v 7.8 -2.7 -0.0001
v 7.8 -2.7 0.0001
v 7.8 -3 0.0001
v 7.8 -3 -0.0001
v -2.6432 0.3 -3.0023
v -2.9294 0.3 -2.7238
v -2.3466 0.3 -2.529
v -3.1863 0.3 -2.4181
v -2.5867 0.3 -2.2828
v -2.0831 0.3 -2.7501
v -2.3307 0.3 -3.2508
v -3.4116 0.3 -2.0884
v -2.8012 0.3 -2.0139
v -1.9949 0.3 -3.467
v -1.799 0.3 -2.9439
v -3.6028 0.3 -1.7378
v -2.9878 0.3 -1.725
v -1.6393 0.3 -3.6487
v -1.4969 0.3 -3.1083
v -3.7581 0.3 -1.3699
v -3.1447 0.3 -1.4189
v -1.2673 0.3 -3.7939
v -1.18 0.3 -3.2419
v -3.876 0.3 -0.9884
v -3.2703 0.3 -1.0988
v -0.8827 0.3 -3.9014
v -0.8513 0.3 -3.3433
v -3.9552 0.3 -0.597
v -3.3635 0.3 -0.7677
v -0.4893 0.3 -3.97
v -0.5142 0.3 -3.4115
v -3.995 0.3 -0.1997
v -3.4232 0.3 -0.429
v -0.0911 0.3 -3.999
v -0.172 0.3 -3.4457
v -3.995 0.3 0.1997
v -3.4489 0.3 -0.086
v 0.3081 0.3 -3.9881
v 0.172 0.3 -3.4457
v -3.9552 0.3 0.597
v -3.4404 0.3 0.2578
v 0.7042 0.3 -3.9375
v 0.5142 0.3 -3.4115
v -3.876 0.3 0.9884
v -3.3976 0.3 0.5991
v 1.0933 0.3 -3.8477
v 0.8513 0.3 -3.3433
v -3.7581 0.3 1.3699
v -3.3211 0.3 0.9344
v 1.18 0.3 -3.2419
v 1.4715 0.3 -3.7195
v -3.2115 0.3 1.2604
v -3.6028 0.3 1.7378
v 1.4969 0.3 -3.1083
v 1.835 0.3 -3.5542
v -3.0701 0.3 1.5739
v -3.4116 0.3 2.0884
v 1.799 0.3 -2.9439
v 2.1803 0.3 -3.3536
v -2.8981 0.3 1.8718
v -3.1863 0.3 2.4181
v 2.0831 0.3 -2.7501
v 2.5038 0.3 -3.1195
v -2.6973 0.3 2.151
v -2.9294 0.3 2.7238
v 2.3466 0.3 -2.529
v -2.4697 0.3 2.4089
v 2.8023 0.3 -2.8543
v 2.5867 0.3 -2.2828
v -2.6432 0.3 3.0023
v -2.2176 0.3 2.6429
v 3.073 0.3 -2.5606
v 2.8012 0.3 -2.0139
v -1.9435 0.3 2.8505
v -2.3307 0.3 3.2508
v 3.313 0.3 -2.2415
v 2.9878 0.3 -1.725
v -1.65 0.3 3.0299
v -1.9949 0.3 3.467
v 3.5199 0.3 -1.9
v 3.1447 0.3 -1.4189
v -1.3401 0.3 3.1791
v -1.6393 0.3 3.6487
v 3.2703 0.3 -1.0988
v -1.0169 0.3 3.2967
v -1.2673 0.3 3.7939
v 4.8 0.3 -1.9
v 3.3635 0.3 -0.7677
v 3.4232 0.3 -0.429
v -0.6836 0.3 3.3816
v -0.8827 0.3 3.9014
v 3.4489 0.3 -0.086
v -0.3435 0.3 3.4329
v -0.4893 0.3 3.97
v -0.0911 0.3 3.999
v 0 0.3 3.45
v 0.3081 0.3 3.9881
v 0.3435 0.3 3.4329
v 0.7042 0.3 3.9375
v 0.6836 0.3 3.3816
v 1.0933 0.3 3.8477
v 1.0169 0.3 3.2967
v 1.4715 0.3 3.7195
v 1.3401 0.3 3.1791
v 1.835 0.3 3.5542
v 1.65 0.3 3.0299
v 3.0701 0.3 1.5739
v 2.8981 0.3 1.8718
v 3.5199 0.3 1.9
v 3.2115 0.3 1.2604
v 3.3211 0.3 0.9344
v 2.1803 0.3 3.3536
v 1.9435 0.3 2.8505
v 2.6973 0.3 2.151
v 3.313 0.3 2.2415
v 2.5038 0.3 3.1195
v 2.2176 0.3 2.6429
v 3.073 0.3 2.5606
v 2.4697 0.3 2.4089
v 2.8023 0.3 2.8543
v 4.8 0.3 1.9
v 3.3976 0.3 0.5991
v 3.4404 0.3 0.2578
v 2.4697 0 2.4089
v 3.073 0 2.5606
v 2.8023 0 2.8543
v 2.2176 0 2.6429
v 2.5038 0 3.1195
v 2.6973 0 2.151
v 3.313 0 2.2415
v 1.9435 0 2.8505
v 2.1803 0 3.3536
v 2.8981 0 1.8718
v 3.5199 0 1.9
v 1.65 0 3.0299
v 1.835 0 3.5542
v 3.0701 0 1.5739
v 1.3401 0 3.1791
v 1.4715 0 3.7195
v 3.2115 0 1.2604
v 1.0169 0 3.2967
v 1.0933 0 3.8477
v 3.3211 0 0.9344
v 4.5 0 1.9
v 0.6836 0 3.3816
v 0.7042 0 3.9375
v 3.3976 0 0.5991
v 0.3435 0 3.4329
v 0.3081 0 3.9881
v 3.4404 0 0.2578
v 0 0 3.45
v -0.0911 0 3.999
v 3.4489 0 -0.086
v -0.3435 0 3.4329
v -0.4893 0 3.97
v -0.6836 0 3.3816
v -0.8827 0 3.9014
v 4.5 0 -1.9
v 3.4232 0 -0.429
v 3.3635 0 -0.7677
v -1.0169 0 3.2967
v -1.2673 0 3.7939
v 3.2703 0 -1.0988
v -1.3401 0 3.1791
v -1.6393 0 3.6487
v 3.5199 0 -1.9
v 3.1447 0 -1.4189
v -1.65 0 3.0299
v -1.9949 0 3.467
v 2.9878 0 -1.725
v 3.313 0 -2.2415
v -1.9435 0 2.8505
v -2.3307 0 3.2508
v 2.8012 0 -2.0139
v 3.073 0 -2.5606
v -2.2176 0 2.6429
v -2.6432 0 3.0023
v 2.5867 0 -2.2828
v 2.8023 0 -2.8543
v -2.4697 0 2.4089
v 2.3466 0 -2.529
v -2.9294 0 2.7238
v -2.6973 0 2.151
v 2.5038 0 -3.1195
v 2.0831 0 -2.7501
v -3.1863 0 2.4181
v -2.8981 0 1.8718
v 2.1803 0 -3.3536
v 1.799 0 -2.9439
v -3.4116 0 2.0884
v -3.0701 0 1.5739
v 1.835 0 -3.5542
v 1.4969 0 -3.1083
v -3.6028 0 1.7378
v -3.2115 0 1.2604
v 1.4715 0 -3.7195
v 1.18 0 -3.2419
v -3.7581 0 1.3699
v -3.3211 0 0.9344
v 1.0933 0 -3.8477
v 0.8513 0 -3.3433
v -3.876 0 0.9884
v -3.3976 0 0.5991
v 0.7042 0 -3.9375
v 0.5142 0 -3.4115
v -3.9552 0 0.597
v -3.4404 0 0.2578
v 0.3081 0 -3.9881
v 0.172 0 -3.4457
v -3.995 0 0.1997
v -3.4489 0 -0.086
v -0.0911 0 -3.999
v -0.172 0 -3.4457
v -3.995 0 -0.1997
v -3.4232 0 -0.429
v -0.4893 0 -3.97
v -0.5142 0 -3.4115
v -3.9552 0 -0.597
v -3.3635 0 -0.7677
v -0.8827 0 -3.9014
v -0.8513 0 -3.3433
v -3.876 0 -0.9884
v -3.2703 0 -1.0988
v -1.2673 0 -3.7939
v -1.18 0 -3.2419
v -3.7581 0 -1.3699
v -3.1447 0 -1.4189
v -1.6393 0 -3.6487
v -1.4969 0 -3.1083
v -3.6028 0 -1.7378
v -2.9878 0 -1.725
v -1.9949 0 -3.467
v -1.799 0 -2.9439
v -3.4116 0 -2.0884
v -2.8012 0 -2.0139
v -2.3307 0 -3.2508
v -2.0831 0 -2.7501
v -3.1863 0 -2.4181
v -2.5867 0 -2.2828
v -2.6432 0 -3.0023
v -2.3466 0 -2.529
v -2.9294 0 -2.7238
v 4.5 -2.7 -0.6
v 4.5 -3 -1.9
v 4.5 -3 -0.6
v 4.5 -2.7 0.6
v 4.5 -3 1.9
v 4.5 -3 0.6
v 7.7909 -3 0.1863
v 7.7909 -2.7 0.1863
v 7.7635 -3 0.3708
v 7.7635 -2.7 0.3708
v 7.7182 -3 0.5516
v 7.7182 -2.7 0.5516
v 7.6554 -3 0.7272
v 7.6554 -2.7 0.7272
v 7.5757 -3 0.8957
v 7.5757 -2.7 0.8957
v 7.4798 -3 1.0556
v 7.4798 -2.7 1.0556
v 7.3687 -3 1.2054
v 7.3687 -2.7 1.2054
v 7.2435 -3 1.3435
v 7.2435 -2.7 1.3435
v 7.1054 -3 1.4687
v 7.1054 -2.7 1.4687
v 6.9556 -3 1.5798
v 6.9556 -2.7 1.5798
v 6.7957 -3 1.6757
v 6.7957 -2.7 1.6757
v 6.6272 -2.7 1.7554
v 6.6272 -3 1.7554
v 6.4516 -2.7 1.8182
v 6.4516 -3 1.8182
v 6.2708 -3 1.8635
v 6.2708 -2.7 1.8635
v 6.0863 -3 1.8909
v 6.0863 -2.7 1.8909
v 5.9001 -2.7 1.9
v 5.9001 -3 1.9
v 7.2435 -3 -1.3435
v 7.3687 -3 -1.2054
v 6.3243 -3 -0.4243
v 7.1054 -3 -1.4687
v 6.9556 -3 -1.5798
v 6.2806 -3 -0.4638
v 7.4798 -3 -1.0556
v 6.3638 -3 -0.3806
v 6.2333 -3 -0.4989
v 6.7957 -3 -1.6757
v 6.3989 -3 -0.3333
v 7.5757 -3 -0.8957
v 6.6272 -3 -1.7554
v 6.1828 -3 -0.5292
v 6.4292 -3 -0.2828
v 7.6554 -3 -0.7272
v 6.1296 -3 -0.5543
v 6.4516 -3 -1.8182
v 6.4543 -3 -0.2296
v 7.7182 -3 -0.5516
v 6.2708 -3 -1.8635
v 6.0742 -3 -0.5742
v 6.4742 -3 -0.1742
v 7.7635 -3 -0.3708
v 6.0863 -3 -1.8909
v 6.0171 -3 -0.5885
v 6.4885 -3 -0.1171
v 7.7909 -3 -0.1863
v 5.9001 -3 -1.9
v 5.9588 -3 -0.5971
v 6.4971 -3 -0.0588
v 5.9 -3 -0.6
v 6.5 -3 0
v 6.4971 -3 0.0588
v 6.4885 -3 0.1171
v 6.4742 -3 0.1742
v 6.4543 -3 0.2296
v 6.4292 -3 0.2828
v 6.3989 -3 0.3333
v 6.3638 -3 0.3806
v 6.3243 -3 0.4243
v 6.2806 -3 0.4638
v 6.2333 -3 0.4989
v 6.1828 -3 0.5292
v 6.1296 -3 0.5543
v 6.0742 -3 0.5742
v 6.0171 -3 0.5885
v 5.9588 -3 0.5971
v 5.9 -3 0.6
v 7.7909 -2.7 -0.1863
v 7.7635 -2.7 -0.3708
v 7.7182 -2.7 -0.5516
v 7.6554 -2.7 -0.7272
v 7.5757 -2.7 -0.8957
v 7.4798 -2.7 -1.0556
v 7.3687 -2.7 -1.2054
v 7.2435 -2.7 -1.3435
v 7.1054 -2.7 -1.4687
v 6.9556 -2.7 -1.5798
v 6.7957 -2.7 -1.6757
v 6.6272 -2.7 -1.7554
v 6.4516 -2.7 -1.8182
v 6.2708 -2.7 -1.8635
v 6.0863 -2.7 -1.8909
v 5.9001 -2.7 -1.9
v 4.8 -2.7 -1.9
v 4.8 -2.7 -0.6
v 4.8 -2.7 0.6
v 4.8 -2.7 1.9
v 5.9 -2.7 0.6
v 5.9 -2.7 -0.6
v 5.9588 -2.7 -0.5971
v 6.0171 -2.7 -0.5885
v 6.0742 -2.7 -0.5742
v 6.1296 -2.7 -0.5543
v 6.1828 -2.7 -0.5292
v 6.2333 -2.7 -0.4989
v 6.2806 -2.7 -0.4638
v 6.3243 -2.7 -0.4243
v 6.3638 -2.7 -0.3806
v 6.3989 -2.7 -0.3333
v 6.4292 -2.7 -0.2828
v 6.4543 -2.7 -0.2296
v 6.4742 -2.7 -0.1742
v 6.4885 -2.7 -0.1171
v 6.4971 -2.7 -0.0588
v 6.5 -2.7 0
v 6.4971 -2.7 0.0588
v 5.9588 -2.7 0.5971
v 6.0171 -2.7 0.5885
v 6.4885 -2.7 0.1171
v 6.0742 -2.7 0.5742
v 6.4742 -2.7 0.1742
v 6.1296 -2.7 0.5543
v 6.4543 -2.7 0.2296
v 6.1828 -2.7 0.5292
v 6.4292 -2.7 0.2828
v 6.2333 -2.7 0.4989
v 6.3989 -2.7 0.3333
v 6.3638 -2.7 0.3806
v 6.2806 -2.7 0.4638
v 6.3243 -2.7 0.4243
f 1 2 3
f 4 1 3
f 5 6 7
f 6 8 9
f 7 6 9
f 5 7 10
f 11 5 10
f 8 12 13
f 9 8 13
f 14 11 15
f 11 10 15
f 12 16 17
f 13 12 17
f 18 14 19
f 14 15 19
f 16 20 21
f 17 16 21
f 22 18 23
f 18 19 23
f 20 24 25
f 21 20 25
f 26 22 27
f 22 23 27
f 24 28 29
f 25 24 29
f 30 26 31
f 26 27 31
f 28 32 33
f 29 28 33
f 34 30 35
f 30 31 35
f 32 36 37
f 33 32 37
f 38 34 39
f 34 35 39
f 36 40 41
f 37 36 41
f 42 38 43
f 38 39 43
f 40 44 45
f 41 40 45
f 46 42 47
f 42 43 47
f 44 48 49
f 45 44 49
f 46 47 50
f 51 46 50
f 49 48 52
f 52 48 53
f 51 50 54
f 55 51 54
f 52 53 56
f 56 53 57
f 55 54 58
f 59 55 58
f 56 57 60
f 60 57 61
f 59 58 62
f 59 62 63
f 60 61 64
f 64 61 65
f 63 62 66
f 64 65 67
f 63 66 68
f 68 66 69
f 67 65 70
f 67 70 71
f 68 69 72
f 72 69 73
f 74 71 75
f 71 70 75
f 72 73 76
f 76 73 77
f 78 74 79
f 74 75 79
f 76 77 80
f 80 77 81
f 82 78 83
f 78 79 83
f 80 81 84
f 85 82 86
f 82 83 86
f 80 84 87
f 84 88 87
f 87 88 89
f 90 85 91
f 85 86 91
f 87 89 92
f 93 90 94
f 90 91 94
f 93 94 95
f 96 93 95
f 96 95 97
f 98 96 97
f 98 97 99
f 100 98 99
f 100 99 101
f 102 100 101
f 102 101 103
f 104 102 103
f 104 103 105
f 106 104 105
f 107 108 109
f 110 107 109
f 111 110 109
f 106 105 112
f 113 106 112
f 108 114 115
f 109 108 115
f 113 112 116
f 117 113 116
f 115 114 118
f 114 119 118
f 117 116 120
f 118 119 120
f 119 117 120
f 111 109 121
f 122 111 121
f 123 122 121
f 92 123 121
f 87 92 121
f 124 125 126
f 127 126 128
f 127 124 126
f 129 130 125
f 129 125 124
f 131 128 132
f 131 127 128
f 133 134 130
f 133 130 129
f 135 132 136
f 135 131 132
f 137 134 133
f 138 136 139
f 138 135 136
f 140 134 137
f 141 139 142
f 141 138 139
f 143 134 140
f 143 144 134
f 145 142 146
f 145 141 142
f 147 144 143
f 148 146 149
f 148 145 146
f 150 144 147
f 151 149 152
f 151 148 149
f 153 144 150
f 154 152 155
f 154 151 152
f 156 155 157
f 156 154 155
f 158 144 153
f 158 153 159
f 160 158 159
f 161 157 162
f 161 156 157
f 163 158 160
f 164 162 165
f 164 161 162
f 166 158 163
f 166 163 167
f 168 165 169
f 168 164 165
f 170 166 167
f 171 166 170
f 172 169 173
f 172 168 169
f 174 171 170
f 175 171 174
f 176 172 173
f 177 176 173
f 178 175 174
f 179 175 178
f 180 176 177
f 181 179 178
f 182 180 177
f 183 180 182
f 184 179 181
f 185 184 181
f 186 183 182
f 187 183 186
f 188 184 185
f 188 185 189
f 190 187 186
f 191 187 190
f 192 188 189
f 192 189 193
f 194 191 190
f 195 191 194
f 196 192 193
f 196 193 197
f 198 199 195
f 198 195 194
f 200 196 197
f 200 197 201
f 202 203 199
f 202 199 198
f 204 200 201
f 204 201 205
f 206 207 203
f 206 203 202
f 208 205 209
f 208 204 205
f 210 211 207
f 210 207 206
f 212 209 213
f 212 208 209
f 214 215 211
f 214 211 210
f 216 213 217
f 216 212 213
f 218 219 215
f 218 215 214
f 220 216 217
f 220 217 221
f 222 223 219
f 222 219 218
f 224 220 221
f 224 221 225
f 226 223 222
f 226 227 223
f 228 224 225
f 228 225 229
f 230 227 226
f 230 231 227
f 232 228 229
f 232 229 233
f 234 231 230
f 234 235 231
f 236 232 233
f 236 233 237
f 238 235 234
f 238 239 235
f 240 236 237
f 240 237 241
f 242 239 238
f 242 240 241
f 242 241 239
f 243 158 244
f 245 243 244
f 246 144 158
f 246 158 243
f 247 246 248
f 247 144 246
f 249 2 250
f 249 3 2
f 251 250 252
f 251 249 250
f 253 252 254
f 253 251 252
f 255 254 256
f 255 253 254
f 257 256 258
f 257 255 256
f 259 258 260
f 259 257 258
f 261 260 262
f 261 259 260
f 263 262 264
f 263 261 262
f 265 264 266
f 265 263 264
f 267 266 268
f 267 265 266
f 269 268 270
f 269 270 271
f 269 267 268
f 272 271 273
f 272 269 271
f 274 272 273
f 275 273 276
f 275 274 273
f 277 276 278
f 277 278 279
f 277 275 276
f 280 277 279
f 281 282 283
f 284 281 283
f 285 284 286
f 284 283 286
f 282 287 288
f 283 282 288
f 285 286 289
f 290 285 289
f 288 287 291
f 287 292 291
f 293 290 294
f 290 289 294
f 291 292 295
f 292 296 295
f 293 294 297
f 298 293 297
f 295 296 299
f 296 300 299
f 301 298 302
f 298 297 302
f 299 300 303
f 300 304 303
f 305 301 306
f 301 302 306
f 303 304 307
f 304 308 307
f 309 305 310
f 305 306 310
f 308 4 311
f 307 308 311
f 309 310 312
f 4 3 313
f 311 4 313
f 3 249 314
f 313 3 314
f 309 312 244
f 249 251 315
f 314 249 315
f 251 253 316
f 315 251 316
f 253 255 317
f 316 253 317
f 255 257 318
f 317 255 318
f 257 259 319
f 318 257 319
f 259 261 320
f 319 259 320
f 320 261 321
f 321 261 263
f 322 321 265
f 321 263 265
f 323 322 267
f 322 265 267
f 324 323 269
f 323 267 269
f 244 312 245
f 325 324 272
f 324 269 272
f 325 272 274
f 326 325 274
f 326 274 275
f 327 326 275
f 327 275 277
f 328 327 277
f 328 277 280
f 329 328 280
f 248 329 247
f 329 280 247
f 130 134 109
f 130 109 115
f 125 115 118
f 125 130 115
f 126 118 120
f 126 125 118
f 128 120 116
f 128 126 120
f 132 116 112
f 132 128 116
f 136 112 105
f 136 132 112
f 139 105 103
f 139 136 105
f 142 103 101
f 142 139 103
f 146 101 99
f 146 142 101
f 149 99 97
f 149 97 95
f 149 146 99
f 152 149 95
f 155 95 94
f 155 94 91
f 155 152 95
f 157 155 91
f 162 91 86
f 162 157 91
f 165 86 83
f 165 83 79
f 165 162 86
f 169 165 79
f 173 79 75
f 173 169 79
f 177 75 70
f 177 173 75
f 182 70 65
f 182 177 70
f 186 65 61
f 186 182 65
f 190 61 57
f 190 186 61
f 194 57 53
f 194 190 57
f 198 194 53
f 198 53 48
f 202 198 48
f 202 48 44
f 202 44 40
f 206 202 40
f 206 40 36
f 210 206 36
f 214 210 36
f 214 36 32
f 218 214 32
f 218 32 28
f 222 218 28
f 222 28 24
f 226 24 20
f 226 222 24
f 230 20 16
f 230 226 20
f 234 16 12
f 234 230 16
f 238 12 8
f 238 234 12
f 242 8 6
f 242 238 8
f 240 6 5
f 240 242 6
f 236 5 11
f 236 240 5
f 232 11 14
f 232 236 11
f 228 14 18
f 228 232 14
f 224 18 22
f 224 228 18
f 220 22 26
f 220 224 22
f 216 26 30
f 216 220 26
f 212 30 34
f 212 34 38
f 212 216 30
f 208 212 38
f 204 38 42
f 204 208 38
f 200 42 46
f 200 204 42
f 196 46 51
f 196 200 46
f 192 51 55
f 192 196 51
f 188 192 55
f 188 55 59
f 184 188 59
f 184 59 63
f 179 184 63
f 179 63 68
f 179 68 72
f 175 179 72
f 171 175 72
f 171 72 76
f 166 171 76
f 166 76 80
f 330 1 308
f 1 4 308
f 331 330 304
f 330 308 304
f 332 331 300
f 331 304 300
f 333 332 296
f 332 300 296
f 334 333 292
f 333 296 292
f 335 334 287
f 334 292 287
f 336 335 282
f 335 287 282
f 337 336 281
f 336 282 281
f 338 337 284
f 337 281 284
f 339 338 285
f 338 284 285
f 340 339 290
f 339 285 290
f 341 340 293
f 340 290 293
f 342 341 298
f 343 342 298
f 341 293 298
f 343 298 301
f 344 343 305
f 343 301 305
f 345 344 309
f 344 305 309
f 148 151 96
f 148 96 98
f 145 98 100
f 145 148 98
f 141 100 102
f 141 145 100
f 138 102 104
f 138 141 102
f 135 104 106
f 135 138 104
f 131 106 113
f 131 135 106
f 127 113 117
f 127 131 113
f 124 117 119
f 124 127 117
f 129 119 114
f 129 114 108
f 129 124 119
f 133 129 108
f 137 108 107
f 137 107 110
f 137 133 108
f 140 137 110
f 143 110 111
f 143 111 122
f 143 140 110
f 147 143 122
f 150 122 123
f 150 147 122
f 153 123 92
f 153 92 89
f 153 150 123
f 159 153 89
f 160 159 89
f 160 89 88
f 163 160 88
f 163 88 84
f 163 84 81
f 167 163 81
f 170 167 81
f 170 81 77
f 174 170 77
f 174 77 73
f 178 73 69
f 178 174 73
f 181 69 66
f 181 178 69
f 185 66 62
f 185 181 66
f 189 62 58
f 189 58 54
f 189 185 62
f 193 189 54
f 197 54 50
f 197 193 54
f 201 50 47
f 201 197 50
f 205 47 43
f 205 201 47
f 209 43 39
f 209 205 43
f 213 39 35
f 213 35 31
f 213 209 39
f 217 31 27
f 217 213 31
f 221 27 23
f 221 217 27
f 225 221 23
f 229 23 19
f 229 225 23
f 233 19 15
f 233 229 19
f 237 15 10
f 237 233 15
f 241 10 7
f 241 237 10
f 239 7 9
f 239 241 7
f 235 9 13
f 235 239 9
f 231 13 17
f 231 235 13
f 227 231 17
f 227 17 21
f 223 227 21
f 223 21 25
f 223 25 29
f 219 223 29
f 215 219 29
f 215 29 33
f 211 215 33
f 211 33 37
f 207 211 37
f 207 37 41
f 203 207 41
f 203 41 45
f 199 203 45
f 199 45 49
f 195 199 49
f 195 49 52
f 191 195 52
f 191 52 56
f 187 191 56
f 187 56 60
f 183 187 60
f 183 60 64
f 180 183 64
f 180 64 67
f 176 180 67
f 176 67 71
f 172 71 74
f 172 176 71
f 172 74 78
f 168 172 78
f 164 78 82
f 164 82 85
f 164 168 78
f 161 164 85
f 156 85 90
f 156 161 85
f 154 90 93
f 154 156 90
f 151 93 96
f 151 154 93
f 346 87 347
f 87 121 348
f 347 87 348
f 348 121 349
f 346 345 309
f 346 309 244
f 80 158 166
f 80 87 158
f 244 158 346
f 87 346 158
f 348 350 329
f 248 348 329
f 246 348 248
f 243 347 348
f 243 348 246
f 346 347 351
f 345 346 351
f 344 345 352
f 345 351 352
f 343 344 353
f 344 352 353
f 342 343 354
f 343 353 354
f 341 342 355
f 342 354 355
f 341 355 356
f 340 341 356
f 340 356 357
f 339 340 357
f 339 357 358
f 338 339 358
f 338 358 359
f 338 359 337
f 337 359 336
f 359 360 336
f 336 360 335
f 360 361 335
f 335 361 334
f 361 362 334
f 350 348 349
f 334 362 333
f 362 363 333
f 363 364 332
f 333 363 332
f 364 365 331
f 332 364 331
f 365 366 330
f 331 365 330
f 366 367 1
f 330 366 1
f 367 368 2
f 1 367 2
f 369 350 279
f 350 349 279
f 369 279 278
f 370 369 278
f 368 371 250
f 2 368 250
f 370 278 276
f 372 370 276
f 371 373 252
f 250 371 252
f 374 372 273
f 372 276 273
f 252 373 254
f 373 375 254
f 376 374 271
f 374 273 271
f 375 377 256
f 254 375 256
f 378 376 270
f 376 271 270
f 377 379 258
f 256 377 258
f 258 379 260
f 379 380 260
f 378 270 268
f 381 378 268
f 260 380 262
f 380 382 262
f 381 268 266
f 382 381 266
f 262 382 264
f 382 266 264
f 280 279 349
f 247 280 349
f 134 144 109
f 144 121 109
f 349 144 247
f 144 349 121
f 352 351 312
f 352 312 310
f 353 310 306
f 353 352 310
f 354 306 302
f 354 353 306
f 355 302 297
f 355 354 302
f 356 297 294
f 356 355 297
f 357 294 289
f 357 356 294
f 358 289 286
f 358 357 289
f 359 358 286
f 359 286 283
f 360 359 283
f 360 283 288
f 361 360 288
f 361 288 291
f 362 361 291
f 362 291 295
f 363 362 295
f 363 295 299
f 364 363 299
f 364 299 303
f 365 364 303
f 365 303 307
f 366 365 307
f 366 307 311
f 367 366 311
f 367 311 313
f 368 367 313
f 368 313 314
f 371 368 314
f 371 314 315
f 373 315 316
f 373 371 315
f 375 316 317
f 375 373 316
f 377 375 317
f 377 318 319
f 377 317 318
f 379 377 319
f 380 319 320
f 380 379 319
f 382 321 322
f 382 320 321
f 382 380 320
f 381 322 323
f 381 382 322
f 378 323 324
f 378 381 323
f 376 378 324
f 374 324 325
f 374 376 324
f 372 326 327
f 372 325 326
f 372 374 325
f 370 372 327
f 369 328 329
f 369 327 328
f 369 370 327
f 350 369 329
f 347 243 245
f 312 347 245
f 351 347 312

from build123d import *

# Parameters (mm, degrees)
SKETCH_1_R          = 3.45
EXTRUDE_1_DEPTH     = 0.3
SKETCH_2_W          = 8.378641338
SKETCH_2_H          = 6.913843901
CUT_EXTRUDE_1_DEPTH = 10
EXTRUDE_2_DEPTH     = 3.8
FILLET_1_R          = 1.9
CUT_EXTRUDE_2_DEPTH = 10


with BuildPart() as part:
    # 草图1 → 凸台-拉伸1 (new body)
    with BuildSketch(Plane(origin=(0, 0, 0), x_dir=(1, 0, 0), z_dir=(0, 1, 0))):
        with BuildLine():
            Line((3.519943181, 1.9), (10, 1.9))
            ThreePointArc((10, 1.9), (11.9, 0), (10, -1.9))
            Line((10, -1.9), (3.519943181, -1.9))
            ThreePointArc((3.519943181, -1.9), (-4, 0), (3.519943181, 1.9))
        make_face()
        with Locations(Location((0, 0, 0), (0, 0, 270))):
            Circle(SKETCH_1_R, mode=Mode.SUBTRACT)
        with BuildLine():
            Line((10, -0.6), (8.5, -0.6))
            ThreePointArc((8.5, -0.6), (7.9, 0), (8.5, 0.6))
            Line((8.5, 0.6), (10, 0.6))
            ThreePointArc((10, 0.6), (10.6, 0), (10, -0.6))
        make_face(mode=Mode.SUBTRACT)
    extrude(amount=EXTRUDE_1_DEPTH)

    # 草图2 → 切除-拉伸1 (cut)
    with BuildSketch(Plane(origin=(0, 0.3, 0), x_dir=(1, 0, 0), z_dir=(0, 1, 0))):
        with Locations((8.689320669, -0.04590274)):
            Rectangle(SKETCH_2_W, SKETCH_2_H)
    extrude(amount=-CUT_EXTRUDE_1_DEPTH, mode=Mode.SUBTRACT)

    # 草图3 → 凸台-拉伸2 (add)
    with BuildSketch(Plane.XY.offset(1.9)):
        Polygon((4.5, 0.3), (4.8, 0.3), (4.8, -2.7), (7.8, -2.7), (7.8, -3), (4.5, -3), (4.5, 0), align=None)
    extrude(amount=-EXTRUDE_2_DEPTH)

    # 圆角1
    fillet_1_edges = [part.edges().sort_by_distance(p)[0] for p in [
        (7.8, -2.85, -1.9),
        (7.8, -2.85, 1.9),
    ]]
    fillet(fillet_1_edges, radius=FILLET_1_R - 0.0001)  # a hair under: the kernel refuses the full size

    # 草图4 → 切除-拉伸2 (cut)
    with BuildSketch(Plane(origin=(0, -2.7, 0), x_dir=(1, 0, 0), z_dir=(0, 1, 0))):
        with BuildLine():
            Line((5.9, -0.6), (4.4, -0.6))
            ThreePointArc((4.4, -0.6), (3.8, 0), (4.4, 0.6))
            Line((4.4, 0.6), (5.9, 0.6))
            ThreePointArc((5.9, 0.6), (6.5, 0), (5.9, -0.6))
        make_face()
    extrude(amount=-CUT_EXTRUDE_2_DEPTH, mode=Mode.SUBTRACT)


solid = part.part
